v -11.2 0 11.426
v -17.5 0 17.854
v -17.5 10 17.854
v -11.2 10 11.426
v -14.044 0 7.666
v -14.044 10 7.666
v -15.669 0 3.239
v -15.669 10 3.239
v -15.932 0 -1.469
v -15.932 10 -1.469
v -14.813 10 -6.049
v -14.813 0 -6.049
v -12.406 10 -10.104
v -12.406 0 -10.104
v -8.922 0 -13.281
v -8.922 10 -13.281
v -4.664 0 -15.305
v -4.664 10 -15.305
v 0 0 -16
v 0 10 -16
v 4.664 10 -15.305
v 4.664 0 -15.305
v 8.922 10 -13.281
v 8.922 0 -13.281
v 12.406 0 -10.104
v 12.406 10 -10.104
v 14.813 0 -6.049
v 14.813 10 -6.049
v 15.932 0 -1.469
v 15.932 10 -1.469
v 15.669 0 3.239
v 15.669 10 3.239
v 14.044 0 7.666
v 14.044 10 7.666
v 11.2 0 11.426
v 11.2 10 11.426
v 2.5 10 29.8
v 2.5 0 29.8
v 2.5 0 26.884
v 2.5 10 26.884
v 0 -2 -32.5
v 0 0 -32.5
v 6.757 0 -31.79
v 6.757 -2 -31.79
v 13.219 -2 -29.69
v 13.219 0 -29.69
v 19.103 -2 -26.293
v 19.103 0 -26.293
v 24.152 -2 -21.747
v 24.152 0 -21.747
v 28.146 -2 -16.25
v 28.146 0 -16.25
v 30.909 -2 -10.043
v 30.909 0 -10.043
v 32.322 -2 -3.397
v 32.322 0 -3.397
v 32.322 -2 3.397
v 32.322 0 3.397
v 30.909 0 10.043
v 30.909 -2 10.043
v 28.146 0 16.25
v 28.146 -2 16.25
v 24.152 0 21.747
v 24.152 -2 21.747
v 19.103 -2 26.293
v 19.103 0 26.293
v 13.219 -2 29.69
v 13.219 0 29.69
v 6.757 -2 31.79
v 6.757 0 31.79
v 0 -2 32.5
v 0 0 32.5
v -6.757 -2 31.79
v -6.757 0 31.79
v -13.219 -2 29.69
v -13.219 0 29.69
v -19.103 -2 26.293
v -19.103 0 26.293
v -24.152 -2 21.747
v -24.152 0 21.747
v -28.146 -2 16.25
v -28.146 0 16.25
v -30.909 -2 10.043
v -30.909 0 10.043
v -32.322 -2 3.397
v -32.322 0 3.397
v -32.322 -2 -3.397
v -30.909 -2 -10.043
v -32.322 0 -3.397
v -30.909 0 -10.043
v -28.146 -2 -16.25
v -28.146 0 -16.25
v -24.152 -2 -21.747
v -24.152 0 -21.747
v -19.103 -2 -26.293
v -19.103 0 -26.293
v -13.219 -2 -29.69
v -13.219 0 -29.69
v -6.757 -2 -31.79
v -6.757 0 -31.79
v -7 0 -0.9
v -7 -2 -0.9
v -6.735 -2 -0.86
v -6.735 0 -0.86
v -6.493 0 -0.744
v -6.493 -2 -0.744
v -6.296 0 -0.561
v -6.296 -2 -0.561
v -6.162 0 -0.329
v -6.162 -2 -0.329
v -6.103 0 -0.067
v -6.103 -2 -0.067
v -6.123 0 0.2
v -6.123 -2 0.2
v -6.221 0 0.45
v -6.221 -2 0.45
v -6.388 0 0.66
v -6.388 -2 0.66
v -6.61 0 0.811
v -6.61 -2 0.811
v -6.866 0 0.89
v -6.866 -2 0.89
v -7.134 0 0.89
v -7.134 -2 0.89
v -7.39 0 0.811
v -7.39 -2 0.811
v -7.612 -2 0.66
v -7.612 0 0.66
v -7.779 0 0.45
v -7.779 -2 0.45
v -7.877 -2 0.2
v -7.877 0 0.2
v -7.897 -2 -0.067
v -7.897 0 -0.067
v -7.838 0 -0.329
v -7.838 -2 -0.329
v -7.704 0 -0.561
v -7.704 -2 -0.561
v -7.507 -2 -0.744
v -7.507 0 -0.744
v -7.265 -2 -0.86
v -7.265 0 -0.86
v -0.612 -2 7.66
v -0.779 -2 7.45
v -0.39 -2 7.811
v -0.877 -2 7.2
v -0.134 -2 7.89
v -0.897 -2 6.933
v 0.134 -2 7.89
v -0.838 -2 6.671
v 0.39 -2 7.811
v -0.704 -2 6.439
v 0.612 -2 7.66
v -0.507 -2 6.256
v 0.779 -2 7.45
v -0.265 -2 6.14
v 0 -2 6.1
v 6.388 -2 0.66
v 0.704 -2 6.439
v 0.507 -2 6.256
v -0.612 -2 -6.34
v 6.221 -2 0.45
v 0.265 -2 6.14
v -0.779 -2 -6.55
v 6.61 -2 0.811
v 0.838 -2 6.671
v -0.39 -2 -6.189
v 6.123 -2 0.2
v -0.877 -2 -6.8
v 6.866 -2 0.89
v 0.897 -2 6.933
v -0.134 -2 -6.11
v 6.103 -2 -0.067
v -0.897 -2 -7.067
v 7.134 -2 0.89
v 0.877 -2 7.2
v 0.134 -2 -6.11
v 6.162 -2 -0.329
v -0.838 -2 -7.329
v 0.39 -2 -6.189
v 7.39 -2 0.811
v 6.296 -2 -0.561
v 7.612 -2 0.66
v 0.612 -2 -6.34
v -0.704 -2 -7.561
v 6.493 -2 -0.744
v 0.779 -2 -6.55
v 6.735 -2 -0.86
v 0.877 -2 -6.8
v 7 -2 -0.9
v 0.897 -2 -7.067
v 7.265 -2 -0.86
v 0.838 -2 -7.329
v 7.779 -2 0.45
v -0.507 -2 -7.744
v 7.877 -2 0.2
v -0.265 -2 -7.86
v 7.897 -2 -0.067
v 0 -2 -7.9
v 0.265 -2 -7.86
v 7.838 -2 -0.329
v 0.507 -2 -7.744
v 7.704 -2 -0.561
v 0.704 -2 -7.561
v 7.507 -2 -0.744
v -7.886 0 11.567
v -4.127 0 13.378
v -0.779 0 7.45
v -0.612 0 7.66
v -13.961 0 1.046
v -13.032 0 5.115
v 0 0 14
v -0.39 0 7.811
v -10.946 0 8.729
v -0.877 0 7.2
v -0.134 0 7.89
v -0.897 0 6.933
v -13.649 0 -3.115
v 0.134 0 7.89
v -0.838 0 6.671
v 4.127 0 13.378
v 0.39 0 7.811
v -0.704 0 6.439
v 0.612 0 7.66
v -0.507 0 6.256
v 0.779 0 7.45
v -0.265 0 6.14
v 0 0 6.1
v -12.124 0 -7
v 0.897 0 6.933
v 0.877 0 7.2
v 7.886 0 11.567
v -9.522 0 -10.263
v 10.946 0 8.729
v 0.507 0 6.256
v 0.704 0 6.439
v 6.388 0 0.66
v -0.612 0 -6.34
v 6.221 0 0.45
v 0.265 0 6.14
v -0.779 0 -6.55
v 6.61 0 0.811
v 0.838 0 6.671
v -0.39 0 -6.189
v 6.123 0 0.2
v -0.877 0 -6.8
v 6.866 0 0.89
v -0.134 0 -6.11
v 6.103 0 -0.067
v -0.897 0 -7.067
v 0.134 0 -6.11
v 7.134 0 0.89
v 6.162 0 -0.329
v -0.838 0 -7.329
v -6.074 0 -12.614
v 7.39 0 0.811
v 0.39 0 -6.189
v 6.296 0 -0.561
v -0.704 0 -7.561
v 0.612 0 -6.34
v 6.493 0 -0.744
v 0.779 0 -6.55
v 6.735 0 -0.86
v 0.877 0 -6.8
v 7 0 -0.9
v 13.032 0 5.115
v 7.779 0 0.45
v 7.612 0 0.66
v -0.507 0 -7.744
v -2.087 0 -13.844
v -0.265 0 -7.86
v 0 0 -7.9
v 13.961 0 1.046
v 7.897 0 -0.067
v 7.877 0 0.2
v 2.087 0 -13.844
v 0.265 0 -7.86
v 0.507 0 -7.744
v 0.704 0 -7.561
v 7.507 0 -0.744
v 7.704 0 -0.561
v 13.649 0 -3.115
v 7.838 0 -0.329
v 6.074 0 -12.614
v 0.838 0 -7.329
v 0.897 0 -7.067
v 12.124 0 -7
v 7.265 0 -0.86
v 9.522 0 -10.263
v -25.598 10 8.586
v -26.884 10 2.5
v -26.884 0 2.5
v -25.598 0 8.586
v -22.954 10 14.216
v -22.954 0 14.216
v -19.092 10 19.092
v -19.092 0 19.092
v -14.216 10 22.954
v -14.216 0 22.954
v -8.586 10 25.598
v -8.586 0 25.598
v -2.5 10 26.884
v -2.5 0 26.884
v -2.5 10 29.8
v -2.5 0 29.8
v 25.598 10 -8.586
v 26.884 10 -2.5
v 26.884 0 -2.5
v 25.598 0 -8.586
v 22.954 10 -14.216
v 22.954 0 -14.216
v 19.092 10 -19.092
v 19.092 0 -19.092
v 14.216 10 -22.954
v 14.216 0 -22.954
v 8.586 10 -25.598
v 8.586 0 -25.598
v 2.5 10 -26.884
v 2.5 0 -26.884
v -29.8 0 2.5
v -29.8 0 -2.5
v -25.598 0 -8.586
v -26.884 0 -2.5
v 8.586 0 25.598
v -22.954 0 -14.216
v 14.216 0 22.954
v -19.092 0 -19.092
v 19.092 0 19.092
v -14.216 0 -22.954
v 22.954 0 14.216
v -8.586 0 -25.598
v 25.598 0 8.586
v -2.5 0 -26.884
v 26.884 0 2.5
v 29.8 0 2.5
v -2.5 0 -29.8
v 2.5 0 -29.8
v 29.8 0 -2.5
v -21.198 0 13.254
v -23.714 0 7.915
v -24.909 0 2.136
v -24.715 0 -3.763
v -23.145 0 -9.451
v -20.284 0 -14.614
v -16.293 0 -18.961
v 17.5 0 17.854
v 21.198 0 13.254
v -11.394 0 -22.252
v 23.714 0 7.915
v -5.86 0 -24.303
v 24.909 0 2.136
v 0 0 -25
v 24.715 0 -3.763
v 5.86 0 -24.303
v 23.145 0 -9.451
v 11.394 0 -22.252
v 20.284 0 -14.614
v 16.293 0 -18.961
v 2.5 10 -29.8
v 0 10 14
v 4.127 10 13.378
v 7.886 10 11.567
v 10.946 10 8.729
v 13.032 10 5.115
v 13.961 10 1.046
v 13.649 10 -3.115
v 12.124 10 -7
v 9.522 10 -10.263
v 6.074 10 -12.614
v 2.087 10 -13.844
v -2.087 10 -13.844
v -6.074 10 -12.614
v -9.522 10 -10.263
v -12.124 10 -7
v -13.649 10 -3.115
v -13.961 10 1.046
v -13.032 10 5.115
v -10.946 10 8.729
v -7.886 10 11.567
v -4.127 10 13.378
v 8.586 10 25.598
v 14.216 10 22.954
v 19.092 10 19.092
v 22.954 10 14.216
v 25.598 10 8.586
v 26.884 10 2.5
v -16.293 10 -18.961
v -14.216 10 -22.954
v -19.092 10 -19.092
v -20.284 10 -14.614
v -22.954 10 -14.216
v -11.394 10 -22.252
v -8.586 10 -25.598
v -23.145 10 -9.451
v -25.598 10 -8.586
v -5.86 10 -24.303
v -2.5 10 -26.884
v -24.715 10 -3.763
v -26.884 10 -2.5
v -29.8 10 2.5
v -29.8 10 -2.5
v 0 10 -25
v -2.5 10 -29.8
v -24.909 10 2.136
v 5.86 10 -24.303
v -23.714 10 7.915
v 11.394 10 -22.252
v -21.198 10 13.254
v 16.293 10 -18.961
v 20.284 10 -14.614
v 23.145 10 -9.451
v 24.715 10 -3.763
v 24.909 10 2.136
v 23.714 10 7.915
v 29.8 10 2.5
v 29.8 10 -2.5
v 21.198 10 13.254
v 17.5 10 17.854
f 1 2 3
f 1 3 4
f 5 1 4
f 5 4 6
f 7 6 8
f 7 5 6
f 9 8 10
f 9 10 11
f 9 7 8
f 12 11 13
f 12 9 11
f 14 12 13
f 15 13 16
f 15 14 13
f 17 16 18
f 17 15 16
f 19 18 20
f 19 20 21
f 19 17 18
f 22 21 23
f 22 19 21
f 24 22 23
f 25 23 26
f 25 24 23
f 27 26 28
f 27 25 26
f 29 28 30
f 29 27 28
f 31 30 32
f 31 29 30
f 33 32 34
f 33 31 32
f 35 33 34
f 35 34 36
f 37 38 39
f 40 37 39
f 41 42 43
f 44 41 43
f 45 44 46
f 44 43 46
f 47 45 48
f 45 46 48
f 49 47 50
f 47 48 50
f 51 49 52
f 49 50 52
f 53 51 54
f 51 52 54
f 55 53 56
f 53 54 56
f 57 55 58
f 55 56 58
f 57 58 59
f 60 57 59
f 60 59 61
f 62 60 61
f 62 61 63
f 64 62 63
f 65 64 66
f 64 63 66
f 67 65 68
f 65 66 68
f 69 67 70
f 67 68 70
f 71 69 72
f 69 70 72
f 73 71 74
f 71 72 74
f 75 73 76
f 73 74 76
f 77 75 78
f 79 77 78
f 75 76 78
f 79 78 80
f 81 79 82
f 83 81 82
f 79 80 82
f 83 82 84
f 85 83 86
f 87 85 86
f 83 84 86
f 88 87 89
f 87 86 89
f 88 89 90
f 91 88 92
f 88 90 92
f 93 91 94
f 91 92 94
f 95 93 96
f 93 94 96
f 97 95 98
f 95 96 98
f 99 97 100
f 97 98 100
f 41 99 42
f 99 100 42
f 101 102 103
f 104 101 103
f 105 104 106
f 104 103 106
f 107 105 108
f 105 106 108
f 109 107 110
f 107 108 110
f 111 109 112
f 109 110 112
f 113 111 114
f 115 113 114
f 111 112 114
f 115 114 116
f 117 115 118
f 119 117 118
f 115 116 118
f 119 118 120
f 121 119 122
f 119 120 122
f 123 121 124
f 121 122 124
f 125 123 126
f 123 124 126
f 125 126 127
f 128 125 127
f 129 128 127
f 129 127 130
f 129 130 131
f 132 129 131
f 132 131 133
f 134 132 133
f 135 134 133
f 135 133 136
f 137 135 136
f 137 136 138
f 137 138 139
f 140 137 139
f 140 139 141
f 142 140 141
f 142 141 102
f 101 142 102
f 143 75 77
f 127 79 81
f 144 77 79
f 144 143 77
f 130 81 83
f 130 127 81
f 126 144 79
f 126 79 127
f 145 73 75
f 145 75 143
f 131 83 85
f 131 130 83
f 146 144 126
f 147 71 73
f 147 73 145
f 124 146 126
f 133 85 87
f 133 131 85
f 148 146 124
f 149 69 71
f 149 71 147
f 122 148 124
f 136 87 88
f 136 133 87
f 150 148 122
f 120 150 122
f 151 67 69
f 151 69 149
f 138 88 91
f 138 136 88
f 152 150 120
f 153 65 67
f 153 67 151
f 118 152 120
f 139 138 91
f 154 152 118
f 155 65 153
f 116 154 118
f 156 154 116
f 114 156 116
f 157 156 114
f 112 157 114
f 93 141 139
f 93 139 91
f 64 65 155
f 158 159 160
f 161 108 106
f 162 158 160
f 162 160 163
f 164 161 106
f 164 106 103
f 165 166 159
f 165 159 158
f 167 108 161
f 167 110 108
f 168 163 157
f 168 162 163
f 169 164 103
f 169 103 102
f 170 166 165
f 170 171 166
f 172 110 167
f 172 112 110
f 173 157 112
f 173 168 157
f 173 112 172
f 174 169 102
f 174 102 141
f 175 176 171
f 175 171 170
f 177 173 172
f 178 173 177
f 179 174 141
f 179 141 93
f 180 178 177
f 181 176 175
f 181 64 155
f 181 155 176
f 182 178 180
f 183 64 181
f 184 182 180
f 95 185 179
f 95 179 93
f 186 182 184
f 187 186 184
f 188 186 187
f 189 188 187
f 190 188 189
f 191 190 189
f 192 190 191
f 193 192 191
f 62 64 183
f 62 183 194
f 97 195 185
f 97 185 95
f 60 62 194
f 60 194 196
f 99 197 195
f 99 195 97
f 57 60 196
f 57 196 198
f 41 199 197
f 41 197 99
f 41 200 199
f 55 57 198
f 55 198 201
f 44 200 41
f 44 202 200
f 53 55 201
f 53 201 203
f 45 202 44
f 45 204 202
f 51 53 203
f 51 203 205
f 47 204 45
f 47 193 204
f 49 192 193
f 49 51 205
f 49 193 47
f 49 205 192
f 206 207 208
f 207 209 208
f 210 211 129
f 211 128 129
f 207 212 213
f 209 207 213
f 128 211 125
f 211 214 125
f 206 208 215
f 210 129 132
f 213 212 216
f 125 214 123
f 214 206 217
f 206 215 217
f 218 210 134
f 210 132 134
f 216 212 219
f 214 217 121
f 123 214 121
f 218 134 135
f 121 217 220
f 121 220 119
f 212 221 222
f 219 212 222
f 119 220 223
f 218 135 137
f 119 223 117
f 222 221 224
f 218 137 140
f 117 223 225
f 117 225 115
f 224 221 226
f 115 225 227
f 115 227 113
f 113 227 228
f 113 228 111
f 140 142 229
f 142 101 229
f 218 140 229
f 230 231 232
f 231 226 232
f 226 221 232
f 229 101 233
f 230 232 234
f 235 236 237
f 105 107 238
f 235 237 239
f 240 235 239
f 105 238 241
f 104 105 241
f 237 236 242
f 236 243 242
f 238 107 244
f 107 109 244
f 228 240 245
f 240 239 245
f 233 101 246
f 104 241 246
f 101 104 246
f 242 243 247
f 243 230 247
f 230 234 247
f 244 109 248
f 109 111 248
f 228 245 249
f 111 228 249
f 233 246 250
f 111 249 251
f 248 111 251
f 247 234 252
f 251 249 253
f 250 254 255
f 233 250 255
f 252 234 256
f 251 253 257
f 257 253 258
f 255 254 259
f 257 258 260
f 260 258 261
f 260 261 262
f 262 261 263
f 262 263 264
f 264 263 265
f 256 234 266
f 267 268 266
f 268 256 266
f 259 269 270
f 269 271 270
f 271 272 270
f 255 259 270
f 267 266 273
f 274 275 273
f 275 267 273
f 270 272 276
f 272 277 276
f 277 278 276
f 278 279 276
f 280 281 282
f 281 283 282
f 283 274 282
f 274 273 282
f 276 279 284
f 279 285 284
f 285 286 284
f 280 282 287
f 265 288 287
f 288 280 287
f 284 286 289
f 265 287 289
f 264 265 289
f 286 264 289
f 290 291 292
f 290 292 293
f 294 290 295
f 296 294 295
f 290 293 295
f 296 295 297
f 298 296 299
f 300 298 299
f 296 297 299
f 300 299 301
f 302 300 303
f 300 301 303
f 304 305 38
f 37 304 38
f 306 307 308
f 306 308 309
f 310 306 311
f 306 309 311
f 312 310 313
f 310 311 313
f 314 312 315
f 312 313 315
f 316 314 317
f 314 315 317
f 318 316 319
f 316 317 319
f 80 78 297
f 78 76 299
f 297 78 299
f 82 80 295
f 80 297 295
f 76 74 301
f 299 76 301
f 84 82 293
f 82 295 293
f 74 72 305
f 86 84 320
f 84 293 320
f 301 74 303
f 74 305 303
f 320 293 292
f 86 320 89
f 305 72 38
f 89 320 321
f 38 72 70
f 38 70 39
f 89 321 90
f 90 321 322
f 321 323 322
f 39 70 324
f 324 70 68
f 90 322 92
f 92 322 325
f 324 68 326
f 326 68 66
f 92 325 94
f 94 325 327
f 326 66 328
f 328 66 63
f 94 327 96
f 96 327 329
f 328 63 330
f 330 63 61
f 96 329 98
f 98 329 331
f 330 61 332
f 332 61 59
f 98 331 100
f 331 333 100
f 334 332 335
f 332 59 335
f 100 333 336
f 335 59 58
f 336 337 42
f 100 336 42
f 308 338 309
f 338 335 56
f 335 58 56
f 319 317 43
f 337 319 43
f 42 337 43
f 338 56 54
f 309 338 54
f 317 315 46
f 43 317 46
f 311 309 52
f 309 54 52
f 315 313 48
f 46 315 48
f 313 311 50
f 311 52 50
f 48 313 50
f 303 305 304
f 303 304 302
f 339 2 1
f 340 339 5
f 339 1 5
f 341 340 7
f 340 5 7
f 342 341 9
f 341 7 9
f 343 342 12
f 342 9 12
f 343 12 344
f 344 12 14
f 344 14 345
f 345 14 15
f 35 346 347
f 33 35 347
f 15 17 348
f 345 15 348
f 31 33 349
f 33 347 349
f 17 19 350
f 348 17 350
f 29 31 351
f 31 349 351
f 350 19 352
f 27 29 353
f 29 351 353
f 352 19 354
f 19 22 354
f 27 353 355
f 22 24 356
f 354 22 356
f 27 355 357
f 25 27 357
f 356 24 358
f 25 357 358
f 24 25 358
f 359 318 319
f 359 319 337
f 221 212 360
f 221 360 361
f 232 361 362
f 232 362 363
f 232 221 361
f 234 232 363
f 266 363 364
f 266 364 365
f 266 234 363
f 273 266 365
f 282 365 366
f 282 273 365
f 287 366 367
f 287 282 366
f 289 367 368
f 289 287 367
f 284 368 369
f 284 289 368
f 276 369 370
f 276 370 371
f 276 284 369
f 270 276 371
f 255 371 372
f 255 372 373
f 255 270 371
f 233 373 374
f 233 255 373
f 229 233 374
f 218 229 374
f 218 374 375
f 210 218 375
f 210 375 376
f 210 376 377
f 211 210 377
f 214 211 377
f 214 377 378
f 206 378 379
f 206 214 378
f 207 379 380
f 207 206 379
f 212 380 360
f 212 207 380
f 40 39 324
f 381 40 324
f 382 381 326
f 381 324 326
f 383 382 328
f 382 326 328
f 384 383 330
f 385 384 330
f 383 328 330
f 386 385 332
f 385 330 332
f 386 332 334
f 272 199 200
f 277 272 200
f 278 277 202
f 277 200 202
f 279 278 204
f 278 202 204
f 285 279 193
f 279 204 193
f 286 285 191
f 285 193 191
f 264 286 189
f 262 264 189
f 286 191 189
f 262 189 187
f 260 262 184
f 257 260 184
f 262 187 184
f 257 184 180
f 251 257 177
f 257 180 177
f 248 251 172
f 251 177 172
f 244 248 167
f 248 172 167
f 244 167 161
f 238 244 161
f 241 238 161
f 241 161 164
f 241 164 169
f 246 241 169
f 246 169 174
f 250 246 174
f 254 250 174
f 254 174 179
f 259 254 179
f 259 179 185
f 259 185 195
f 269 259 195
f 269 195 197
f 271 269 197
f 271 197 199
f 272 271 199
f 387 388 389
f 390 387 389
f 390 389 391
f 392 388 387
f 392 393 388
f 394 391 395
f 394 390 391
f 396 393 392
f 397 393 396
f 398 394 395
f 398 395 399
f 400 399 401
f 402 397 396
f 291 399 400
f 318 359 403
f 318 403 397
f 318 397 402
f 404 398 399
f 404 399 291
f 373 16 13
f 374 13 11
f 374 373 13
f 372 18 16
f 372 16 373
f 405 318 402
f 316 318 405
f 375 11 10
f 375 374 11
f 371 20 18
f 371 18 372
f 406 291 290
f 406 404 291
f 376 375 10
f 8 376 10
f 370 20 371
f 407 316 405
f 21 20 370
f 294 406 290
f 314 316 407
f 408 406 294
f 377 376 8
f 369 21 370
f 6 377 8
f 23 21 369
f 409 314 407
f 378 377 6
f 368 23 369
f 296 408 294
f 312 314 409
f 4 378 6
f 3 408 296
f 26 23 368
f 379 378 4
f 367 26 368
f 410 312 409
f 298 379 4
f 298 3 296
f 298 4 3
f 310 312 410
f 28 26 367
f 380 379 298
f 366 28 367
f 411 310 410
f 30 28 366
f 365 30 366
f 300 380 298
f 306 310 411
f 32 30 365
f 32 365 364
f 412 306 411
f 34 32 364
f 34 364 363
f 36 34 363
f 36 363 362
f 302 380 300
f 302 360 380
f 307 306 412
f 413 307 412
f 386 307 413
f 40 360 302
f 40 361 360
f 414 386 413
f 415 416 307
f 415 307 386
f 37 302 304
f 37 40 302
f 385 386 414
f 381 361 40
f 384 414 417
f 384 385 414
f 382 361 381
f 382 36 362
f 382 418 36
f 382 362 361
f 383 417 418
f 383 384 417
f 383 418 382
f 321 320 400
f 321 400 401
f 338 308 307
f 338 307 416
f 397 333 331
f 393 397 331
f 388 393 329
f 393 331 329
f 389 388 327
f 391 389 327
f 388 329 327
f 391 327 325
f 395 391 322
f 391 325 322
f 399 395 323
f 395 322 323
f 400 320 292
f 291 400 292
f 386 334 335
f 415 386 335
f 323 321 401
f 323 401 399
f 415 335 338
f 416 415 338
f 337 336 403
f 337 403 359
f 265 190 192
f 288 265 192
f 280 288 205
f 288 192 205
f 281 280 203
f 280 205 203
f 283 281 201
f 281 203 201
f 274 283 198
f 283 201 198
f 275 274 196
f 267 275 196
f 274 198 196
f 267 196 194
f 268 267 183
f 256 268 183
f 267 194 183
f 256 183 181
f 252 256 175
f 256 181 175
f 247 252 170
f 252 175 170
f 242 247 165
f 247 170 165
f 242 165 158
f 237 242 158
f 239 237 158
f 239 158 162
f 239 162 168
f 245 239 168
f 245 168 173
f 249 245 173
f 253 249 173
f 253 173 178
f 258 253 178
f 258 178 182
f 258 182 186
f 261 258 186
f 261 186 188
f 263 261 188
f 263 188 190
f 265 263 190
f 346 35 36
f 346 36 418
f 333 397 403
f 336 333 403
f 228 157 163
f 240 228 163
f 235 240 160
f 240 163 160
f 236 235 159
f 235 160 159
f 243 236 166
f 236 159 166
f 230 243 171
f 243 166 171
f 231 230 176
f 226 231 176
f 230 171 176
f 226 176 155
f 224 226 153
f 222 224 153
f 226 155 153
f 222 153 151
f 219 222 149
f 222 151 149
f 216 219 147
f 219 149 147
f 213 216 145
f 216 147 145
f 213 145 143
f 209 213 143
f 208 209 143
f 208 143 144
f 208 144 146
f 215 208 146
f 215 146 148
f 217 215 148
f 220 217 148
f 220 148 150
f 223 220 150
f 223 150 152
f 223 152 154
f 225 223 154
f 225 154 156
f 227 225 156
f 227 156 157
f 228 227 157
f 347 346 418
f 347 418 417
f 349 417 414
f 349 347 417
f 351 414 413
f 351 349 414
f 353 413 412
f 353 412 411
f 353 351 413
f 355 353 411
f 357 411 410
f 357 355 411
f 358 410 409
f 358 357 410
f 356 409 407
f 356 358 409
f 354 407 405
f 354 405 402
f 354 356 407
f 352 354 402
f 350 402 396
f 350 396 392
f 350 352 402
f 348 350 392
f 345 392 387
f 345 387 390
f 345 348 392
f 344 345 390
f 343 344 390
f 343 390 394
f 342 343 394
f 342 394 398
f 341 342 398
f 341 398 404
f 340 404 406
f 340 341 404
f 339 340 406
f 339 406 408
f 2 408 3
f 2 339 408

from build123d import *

# Parameters (mm, degrees)
SKETCH1_R           = 27
SKETCH1_R_2         = 14
BOSS_EXTRUDE1_DEPTH = 10
SKETCH2_R           = 32.5
BOSS_EXTRUDE2_DEPTH = 2
SKETCH3_W           = 5
SKETCH3_H           = 4.39677325
SKETCH3_W_2         = 4.39677325
SKETCH3_H_2         = 5
BOSS_EXTRUDE3_DEPTH = 10
CUT_EXTRUDE1_REACH  = 49.503
SKETCH4_R           = 0.9


with BuildPart() as part:
    # Sketch1 → Boss-Extrude1 (new body)
    with BuildSketch(Plane(origin=(0, 0, 0), x_dir=(1, 0, 0), z_dir=(0, 1, 0))):
        with Locations(Location((0, 0, 0), (0, 0, 270))):
            Circle(SKETCH1_R)
        with Locations(Location((0, 0, 0), (0, 0, 270))):
            Circle(SKETCH1_R_2, mode=Mode.SUBTRACT)
        with BuildLine():
            Line((-17.5, -17.853571071), (-11.2, -11.426285486))
            ThreePointArc((-11.2, -11.426285486), (0, 16), (11.2, -11.426285486))
            Line((11.2, -11.426285486), (17.5, -17.853571071))
            ThreePointArc((17.5, -17.853571071), (0, 25), (-17.5, -17.853571071))
        make_face(mode=Mode.SUBTRACT)
    extrude(amount=BOSS_EXTRUDE1_DEPTH)

    # Sketch2 → Boss-Extrude2 (add)
    with BuildSketch(Plane.XZ):
        with Locations(Location((0, 0, 0), (0, 0, 270))):
            Circle(SKETCH2_R)
    extrude(amount=BOSS_EXTRUDE2_DEPTH)

    # Sketch3 → Boss-Extrude3 (add)
    with BuildSketch(Plane(origin=(0, 0, 0), x_dir=(1, 0, 0), z_dir=(0, 1, 0))):
        with Locations((0, 27.601613375)):
            Rectangle(SKETCH3_W, SKETCH3_H)
        with Locations((27.601613375, 0)):
            Rectangle(SKETCH3_W_2, SKETCH3_H_2)
        with Locations((0, -27.601613375)):
            Rectangle(SKETCH3_W, SKETCH3_H)
        with Locations((-27.601613375, 0)):
            Rectangle(SKETCH3_W_2, SKETCH3_H_2)
    extrude(amount=BOSS_EXTRUDE3_DEPTH)

    # Sketch4 → Cut-Extrude1 (cut, up to next)
    with BuildSketch(Plane.XZ.offset(2), mode=Mode.PRIVATE) as cut_extrude1_sk1:
        with Locations(Location((0, -7, 0), (0, 0, 270))):
            Circle(SKETCH4_R)
    cut_extrude1_tool1 = extrude(cut_extrude1_sk1.sketch, amount=-CUT_EXTRUDE1_REACH, mode=Mode.PRIVATE) & part.part
    # Sketch4 → Cut-Extrude1 (cut, up to next)
    with BuildSketch(Plane.XZ.offset(2), mode=Mode.PRIVATE) as cut_extrude1_sk2:
        with Locations(Location((-7, 0, 0), (0, 0, 270))):
            Circle(SKETCH4_R)
    cut_extrude1_tool2 = extrude(cut_extrude1_sk2.sketch, amount=-CUT_EXTRUDE1_REACH, mode=Mode.PRIVATE) & part.part
    # Sketch4 → Cut-Extrude1 (cut, up to next)
    with BuildSketch(Plane.XZ.offset(2), mode=Mode.PRIVATE) as cut_extrude1_sk3:
        with Locations(Location((0, 7, 0), (0, 0, 270))):
            Circle(SKETCH4_R)
    cut_extrude1_tool3 = extrude(cut_extrude1_sk3.sketch, amount=-CUT_EXTRUDE1_REACH, mode=Mode.PRIVATE) & part.part
    # Sketch4 → Cut-Extrude1 (cut, up to next)
    with BuildSketch(Plane.XZ.offset(2), mode=Mode.PRIVATE) as cut_extrude1_sk4:
        with Locations(Location((7, 0, 0), (0, 0, 270))):
            Circle(SKETCH4_R)
    cut_extrude1_tool4 = extrude(cut_extrude1_sk4.sketch, amount=-CUT_EXTRUDE1_REACH, mode=Mode.PRIVATE) & part.part
    add(cut_extrude1_tool1.solids().sort_by_distance((0, -2, -7))[0], mode=Mode.SUBTRACT)
    add(cut_extrude1_tool2.solids().sort_by_distance((-7, -2, 0))[0], mode=Mode.SUBTRACT)
    add(cut_extrude1_tool3.solids().sort_by_distance((0, -2, 7))[0], mode=Mode.SUBTRACT)
    add(cut_extrude1_tool4.solids().sort_by_distance((7, -2, 0))[0], mode=Mode.SUBTRACT)


solid = part.part
